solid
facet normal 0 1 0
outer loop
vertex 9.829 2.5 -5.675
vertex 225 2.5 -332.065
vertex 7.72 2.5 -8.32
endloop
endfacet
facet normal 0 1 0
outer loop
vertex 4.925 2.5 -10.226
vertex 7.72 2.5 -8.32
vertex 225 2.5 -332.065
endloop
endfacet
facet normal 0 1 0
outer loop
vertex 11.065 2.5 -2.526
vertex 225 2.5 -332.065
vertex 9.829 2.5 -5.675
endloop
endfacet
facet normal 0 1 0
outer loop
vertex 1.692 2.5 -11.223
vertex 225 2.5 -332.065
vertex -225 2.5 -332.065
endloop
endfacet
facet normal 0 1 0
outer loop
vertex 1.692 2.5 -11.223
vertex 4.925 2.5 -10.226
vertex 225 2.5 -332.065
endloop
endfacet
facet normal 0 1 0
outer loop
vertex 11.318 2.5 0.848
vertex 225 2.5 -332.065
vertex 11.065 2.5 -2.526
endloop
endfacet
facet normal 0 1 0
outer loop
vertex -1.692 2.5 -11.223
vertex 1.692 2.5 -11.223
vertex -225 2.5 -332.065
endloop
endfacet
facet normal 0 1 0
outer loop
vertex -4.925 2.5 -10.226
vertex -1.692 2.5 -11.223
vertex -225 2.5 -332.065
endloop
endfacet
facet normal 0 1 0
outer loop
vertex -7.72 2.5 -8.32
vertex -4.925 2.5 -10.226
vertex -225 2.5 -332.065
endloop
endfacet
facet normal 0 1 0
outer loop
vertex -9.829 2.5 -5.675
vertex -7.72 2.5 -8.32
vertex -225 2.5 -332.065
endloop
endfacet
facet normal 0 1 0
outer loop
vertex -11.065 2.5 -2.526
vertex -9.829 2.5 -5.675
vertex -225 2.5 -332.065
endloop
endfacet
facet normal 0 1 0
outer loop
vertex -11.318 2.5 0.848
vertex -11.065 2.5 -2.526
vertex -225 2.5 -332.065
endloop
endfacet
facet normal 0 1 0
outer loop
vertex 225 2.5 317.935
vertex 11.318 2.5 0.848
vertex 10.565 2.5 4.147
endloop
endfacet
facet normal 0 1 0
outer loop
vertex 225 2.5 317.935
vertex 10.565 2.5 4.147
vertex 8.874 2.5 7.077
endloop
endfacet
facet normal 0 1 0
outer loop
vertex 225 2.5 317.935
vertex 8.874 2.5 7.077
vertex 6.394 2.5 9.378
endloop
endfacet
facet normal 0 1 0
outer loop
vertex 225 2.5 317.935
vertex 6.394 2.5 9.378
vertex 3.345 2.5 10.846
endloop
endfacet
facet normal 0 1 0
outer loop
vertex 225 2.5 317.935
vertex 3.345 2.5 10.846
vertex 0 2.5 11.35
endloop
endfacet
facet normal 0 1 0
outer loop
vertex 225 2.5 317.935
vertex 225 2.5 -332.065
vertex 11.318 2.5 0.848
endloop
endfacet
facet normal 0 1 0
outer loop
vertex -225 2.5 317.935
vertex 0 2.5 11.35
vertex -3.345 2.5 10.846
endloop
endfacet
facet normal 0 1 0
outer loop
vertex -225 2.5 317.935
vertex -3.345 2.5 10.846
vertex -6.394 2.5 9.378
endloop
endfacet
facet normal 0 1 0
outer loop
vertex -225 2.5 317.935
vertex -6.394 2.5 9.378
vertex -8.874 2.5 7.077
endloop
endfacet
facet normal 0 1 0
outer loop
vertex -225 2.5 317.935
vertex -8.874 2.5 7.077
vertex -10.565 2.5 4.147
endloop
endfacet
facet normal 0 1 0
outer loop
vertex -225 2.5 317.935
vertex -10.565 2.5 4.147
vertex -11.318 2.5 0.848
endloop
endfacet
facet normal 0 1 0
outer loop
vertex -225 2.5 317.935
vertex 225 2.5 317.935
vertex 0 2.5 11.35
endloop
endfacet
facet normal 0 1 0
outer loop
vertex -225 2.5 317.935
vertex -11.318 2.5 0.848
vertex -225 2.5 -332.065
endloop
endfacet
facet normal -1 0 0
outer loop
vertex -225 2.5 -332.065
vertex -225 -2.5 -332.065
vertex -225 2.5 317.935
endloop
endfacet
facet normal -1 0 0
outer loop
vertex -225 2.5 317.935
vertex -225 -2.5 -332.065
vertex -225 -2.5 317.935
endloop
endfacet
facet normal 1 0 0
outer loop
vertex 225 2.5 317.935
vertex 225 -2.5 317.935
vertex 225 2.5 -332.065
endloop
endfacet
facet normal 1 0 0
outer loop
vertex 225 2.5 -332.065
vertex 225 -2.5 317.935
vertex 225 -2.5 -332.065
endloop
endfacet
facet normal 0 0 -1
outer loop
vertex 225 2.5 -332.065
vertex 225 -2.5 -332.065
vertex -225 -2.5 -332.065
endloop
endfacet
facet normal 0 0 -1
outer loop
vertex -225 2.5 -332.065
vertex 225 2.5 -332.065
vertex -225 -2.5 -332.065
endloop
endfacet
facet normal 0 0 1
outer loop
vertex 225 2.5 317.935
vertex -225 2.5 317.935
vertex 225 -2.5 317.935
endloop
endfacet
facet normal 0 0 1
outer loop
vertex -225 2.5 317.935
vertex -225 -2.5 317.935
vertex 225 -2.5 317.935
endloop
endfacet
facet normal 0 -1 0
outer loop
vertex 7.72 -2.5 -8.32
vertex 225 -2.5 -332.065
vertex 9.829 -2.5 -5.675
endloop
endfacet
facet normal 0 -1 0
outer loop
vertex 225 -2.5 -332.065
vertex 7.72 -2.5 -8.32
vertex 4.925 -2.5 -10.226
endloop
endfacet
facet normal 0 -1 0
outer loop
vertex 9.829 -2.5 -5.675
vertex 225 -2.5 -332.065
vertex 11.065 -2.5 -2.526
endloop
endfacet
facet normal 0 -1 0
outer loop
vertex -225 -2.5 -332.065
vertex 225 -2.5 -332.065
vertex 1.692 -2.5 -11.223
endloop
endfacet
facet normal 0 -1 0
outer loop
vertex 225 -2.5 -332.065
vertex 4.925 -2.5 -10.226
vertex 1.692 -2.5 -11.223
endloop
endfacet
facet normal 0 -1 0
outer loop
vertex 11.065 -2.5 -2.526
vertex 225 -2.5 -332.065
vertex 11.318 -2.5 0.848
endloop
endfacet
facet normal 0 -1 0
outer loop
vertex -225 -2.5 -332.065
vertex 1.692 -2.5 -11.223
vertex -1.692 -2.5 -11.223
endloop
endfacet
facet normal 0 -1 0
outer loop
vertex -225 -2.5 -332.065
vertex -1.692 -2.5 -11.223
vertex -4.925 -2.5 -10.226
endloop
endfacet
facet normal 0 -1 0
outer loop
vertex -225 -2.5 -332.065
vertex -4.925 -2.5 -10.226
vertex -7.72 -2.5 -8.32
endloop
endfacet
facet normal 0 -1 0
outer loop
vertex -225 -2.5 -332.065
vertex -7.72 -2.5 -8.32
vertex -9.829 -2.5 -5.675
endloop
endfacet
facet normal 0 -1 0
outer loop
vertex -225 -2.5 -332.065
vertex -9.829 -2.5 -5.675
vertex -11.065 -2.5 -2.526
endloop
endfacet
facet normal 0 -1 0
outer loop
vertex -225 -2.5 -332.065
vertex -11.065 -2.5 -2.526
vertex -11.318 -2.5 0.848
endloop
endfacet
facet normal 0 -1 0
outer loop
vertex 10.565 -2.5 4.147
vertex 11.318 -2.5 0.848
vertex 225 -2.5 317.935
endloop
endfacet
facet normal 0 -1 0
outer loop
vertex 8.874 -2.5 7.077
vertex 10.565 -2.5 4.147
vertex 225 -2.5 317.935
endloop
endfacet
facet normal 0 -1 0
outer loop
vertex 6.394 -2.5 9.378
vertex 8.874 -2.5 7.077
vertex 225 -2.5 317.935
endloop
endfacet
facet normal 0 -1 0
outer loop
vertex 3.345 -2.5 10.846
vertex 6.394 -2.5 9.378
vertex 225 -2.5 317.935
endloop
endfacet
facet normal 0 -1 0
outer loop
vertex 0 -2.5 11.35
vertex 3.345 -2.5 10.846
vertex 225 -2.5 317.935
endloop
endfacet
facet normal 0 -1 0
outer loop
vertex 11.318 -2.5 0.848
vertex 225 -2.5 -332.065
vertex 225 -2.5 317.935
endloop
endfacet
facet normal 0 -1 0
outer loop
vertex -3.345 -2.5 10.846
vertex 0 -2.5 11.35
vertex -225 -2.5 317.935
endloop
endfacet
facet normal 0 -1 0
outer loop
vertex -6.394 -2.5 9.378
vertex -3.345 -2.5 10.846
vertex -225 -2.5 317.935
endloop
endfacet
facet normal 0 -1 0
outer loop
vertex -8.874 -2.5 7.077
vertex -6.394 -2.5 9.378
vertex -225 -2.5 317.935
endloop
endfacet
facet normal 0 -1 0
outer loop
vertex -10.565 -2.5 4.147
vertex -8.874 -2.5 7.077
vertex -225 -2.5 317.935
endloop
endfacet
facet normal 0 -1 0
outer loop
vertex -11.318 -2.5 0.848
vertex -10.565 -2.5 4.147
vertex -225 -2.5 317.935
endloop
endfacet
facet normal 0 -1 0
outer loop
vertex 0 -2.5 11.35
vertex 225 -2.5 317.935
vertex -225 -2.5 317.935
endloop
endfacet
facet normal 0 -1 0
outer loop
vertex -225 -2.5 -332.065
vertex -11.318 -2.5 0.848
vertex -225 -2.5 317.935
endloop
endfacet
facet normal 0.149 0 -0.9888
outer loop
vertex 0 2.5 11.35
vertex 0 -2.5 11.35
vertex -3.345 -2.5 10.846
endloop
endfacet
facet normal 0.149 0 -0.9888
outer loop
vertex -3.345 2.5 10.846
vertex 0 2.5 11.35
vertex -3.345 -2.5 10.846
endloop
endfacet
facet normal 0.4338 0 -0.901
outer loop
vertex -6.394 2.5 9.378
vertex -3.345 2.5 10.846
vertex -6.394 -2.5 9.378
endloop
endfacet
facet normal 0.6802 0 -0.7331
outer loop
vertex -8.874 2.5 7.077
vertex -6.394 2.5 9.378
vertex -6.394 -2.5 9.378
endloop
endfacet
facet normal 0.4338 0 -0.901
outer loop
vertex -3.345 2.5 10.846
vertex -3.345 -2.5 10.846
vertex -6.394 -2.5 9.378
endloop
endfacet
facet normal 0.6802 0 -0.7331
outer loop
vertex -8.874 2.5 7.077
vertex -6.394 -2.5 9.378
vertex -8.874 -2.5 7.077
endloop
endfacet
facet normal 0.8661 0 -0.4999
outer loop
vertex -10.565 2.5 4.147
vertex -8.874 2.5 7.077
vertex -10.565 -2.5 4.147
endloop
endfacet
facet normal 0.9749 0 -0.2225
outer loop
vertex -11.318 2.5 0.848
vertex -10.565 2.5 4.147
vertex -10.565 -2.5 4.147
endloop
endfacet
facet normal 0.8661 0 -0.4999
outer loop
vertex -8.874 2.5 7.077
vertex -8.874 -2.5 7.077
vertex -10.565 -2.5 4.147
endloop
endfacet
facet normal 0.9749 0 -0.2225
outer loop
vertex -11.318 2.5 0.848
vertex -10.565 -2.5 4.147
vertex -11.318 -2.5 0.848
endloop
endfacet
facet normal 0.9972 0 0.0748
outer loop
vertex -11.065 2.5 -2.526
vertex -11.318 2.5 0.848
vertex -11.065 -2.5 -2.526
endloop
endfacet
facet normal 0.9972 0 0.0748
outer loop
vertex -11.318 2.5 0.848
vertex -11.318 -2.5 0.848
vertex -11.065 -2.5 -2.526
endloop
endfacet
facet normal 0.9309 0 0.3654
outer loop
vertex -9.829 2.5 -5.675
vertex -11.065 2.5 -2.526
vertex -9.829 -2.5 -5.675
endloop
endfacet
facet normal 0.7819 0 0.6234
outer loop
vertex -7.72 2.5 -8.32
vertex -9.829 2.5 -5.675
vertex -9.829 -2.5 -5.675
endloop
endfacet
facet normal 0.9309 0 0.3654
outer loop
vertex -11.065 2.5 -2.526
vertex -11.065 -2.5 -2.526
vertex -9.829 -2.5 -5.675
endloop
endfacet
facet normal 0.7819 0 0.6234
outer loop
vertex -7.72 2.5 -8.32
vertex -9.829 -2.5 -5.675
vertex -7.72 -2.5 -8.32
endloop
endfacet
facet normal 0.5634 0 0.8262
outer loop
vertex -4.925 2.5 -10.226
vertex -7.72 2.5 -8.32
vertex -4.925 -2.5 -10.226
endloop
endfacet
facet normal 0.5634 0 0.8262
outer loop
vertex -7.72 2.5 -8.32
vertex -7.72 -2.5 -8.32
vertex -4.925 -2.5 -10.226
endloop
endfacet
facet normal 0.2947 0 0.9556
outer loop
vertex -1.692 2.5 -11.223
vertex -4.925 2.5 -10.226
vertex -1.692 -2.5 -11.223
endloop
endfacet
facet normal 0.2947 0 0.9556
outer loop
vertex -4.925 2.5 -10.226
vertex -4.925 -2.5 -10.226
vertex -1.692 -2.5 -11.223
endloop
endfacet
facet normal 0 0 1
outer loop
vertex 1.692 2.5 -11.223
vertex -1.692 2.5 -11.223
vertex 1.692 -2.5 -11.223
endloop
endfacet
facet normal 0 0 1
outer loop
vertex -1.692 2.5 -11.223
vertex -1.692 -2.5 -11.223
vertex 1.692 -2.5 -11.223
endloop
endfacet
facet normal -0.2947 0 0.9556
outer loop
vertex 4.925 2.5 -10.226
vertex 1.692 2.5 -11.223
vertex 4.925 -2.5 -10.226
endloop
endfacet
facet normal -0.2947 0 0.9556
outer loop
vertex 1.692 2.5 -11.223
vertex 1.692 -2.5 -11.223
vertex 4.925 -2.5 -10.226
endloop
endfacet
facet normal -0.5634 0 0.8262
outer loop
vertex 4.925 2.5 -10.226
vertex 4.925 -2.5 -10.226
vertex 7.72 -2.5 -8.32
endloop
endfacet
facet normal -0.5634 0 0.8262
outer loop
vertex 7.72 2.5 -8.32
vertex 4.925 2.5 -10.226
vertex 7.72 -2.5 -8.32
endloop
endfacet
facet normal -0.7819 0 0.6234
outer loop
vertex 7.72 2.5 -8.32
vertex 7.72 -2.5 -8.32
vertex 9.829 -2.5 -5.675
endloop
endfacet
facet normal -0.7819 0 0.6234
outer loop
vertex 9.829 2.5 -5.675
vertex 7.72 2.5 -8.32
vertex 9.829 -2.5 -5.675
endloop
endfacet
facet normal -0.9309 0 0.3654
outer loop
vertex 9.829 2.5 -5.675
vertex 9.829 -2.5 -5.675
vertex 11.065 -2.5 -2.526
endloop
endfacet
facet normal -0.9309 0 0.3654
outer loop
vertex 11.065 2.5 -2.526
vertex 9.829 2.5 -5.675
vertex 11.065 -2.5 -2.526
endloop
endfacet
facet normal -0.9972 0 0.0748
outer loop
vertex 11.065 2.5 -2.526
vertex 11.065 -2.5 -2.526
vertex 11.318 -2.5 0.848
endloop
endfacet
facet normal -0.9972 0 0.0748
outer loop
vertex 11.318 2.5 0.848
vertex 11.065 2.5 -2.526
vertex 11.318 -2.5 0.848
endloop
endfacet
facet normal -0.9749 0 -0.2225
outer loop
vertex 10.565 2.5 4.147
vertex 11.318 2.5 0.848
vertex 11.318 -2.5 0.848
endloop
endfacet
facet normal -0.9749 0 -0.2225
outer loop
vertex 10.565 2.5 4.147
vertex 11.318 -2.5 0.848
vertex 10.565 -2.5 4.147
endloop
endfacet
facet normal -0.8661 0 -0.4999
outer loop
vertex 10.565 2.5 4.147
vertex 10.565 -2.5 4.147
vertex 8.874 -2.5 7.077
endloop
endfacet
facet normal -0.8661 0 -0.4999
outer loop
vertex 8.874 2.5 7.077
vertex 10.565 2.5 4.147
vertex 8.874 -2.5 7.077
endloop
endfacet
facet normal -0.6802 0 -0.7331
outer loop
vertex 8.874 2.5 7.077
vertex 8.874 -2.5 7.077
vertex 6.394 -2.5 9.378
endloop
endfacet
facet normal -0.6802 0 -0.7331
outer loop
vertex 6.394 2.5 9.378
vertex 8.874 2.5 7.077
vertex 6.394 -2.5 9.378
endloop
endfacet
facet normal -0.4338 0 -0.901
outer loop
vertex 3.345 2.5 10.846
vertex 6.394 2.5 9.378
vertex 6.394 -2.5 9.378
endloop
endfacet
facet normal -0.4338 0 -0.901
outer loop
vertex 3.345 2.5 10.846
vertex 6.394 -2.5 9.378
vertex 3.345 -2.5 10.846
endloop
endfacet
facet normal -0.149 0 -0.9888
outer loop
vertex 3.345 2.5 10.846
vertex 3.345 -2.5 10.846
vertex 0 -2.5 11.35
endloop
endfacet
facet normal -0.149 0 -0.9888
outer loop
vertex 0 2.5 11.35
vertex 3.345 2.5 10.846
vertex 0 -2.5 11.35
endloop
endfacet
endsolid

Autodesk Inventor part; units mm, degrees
ref_plane "YZ Plane" through (0, 0, 0) normal (1, 0, 0) x (0, 1, 0)
ref_plane "XZ Plane" through (0, 0, 0) normal (0, 1, 0) x (-1, 0, 0)
ref_plane "XY Plane" through (0, 0, 0) normal (0, 0, 1) x (1, 0, 0)
sketch "Sketch1" plane through (0, 0, 0) normal (0, 1, 0) x (-1, 0, 0)
  line L0 (225, 317.9348) -> (-225, 317.9348)
  line L1 (-225, 317.9348) -> (-225, -332.0652)
  line L2 (-225, -332.0652) -> (225, -332.0652)
  line L3 (225, -332.0652) -> (225, 317.9348)
  point P0 (0, 0)
  dimension "d11" = 450
  dimension "d12" = 650
extrude "Extrusion1" add sketch "Sketch1" along normal mid plane 5
sketch "Sketch2" plane through (0, 2.5, 0) normal (0, 1, 0) x (1, 0, 0)
  point P0 (0, 0)
hole "Hole1" at (0, 2.5, 0) direction (0, -1, 0) diameter 22.7 end through all
properties part number "newbottom" material "PMMA Plastic"
